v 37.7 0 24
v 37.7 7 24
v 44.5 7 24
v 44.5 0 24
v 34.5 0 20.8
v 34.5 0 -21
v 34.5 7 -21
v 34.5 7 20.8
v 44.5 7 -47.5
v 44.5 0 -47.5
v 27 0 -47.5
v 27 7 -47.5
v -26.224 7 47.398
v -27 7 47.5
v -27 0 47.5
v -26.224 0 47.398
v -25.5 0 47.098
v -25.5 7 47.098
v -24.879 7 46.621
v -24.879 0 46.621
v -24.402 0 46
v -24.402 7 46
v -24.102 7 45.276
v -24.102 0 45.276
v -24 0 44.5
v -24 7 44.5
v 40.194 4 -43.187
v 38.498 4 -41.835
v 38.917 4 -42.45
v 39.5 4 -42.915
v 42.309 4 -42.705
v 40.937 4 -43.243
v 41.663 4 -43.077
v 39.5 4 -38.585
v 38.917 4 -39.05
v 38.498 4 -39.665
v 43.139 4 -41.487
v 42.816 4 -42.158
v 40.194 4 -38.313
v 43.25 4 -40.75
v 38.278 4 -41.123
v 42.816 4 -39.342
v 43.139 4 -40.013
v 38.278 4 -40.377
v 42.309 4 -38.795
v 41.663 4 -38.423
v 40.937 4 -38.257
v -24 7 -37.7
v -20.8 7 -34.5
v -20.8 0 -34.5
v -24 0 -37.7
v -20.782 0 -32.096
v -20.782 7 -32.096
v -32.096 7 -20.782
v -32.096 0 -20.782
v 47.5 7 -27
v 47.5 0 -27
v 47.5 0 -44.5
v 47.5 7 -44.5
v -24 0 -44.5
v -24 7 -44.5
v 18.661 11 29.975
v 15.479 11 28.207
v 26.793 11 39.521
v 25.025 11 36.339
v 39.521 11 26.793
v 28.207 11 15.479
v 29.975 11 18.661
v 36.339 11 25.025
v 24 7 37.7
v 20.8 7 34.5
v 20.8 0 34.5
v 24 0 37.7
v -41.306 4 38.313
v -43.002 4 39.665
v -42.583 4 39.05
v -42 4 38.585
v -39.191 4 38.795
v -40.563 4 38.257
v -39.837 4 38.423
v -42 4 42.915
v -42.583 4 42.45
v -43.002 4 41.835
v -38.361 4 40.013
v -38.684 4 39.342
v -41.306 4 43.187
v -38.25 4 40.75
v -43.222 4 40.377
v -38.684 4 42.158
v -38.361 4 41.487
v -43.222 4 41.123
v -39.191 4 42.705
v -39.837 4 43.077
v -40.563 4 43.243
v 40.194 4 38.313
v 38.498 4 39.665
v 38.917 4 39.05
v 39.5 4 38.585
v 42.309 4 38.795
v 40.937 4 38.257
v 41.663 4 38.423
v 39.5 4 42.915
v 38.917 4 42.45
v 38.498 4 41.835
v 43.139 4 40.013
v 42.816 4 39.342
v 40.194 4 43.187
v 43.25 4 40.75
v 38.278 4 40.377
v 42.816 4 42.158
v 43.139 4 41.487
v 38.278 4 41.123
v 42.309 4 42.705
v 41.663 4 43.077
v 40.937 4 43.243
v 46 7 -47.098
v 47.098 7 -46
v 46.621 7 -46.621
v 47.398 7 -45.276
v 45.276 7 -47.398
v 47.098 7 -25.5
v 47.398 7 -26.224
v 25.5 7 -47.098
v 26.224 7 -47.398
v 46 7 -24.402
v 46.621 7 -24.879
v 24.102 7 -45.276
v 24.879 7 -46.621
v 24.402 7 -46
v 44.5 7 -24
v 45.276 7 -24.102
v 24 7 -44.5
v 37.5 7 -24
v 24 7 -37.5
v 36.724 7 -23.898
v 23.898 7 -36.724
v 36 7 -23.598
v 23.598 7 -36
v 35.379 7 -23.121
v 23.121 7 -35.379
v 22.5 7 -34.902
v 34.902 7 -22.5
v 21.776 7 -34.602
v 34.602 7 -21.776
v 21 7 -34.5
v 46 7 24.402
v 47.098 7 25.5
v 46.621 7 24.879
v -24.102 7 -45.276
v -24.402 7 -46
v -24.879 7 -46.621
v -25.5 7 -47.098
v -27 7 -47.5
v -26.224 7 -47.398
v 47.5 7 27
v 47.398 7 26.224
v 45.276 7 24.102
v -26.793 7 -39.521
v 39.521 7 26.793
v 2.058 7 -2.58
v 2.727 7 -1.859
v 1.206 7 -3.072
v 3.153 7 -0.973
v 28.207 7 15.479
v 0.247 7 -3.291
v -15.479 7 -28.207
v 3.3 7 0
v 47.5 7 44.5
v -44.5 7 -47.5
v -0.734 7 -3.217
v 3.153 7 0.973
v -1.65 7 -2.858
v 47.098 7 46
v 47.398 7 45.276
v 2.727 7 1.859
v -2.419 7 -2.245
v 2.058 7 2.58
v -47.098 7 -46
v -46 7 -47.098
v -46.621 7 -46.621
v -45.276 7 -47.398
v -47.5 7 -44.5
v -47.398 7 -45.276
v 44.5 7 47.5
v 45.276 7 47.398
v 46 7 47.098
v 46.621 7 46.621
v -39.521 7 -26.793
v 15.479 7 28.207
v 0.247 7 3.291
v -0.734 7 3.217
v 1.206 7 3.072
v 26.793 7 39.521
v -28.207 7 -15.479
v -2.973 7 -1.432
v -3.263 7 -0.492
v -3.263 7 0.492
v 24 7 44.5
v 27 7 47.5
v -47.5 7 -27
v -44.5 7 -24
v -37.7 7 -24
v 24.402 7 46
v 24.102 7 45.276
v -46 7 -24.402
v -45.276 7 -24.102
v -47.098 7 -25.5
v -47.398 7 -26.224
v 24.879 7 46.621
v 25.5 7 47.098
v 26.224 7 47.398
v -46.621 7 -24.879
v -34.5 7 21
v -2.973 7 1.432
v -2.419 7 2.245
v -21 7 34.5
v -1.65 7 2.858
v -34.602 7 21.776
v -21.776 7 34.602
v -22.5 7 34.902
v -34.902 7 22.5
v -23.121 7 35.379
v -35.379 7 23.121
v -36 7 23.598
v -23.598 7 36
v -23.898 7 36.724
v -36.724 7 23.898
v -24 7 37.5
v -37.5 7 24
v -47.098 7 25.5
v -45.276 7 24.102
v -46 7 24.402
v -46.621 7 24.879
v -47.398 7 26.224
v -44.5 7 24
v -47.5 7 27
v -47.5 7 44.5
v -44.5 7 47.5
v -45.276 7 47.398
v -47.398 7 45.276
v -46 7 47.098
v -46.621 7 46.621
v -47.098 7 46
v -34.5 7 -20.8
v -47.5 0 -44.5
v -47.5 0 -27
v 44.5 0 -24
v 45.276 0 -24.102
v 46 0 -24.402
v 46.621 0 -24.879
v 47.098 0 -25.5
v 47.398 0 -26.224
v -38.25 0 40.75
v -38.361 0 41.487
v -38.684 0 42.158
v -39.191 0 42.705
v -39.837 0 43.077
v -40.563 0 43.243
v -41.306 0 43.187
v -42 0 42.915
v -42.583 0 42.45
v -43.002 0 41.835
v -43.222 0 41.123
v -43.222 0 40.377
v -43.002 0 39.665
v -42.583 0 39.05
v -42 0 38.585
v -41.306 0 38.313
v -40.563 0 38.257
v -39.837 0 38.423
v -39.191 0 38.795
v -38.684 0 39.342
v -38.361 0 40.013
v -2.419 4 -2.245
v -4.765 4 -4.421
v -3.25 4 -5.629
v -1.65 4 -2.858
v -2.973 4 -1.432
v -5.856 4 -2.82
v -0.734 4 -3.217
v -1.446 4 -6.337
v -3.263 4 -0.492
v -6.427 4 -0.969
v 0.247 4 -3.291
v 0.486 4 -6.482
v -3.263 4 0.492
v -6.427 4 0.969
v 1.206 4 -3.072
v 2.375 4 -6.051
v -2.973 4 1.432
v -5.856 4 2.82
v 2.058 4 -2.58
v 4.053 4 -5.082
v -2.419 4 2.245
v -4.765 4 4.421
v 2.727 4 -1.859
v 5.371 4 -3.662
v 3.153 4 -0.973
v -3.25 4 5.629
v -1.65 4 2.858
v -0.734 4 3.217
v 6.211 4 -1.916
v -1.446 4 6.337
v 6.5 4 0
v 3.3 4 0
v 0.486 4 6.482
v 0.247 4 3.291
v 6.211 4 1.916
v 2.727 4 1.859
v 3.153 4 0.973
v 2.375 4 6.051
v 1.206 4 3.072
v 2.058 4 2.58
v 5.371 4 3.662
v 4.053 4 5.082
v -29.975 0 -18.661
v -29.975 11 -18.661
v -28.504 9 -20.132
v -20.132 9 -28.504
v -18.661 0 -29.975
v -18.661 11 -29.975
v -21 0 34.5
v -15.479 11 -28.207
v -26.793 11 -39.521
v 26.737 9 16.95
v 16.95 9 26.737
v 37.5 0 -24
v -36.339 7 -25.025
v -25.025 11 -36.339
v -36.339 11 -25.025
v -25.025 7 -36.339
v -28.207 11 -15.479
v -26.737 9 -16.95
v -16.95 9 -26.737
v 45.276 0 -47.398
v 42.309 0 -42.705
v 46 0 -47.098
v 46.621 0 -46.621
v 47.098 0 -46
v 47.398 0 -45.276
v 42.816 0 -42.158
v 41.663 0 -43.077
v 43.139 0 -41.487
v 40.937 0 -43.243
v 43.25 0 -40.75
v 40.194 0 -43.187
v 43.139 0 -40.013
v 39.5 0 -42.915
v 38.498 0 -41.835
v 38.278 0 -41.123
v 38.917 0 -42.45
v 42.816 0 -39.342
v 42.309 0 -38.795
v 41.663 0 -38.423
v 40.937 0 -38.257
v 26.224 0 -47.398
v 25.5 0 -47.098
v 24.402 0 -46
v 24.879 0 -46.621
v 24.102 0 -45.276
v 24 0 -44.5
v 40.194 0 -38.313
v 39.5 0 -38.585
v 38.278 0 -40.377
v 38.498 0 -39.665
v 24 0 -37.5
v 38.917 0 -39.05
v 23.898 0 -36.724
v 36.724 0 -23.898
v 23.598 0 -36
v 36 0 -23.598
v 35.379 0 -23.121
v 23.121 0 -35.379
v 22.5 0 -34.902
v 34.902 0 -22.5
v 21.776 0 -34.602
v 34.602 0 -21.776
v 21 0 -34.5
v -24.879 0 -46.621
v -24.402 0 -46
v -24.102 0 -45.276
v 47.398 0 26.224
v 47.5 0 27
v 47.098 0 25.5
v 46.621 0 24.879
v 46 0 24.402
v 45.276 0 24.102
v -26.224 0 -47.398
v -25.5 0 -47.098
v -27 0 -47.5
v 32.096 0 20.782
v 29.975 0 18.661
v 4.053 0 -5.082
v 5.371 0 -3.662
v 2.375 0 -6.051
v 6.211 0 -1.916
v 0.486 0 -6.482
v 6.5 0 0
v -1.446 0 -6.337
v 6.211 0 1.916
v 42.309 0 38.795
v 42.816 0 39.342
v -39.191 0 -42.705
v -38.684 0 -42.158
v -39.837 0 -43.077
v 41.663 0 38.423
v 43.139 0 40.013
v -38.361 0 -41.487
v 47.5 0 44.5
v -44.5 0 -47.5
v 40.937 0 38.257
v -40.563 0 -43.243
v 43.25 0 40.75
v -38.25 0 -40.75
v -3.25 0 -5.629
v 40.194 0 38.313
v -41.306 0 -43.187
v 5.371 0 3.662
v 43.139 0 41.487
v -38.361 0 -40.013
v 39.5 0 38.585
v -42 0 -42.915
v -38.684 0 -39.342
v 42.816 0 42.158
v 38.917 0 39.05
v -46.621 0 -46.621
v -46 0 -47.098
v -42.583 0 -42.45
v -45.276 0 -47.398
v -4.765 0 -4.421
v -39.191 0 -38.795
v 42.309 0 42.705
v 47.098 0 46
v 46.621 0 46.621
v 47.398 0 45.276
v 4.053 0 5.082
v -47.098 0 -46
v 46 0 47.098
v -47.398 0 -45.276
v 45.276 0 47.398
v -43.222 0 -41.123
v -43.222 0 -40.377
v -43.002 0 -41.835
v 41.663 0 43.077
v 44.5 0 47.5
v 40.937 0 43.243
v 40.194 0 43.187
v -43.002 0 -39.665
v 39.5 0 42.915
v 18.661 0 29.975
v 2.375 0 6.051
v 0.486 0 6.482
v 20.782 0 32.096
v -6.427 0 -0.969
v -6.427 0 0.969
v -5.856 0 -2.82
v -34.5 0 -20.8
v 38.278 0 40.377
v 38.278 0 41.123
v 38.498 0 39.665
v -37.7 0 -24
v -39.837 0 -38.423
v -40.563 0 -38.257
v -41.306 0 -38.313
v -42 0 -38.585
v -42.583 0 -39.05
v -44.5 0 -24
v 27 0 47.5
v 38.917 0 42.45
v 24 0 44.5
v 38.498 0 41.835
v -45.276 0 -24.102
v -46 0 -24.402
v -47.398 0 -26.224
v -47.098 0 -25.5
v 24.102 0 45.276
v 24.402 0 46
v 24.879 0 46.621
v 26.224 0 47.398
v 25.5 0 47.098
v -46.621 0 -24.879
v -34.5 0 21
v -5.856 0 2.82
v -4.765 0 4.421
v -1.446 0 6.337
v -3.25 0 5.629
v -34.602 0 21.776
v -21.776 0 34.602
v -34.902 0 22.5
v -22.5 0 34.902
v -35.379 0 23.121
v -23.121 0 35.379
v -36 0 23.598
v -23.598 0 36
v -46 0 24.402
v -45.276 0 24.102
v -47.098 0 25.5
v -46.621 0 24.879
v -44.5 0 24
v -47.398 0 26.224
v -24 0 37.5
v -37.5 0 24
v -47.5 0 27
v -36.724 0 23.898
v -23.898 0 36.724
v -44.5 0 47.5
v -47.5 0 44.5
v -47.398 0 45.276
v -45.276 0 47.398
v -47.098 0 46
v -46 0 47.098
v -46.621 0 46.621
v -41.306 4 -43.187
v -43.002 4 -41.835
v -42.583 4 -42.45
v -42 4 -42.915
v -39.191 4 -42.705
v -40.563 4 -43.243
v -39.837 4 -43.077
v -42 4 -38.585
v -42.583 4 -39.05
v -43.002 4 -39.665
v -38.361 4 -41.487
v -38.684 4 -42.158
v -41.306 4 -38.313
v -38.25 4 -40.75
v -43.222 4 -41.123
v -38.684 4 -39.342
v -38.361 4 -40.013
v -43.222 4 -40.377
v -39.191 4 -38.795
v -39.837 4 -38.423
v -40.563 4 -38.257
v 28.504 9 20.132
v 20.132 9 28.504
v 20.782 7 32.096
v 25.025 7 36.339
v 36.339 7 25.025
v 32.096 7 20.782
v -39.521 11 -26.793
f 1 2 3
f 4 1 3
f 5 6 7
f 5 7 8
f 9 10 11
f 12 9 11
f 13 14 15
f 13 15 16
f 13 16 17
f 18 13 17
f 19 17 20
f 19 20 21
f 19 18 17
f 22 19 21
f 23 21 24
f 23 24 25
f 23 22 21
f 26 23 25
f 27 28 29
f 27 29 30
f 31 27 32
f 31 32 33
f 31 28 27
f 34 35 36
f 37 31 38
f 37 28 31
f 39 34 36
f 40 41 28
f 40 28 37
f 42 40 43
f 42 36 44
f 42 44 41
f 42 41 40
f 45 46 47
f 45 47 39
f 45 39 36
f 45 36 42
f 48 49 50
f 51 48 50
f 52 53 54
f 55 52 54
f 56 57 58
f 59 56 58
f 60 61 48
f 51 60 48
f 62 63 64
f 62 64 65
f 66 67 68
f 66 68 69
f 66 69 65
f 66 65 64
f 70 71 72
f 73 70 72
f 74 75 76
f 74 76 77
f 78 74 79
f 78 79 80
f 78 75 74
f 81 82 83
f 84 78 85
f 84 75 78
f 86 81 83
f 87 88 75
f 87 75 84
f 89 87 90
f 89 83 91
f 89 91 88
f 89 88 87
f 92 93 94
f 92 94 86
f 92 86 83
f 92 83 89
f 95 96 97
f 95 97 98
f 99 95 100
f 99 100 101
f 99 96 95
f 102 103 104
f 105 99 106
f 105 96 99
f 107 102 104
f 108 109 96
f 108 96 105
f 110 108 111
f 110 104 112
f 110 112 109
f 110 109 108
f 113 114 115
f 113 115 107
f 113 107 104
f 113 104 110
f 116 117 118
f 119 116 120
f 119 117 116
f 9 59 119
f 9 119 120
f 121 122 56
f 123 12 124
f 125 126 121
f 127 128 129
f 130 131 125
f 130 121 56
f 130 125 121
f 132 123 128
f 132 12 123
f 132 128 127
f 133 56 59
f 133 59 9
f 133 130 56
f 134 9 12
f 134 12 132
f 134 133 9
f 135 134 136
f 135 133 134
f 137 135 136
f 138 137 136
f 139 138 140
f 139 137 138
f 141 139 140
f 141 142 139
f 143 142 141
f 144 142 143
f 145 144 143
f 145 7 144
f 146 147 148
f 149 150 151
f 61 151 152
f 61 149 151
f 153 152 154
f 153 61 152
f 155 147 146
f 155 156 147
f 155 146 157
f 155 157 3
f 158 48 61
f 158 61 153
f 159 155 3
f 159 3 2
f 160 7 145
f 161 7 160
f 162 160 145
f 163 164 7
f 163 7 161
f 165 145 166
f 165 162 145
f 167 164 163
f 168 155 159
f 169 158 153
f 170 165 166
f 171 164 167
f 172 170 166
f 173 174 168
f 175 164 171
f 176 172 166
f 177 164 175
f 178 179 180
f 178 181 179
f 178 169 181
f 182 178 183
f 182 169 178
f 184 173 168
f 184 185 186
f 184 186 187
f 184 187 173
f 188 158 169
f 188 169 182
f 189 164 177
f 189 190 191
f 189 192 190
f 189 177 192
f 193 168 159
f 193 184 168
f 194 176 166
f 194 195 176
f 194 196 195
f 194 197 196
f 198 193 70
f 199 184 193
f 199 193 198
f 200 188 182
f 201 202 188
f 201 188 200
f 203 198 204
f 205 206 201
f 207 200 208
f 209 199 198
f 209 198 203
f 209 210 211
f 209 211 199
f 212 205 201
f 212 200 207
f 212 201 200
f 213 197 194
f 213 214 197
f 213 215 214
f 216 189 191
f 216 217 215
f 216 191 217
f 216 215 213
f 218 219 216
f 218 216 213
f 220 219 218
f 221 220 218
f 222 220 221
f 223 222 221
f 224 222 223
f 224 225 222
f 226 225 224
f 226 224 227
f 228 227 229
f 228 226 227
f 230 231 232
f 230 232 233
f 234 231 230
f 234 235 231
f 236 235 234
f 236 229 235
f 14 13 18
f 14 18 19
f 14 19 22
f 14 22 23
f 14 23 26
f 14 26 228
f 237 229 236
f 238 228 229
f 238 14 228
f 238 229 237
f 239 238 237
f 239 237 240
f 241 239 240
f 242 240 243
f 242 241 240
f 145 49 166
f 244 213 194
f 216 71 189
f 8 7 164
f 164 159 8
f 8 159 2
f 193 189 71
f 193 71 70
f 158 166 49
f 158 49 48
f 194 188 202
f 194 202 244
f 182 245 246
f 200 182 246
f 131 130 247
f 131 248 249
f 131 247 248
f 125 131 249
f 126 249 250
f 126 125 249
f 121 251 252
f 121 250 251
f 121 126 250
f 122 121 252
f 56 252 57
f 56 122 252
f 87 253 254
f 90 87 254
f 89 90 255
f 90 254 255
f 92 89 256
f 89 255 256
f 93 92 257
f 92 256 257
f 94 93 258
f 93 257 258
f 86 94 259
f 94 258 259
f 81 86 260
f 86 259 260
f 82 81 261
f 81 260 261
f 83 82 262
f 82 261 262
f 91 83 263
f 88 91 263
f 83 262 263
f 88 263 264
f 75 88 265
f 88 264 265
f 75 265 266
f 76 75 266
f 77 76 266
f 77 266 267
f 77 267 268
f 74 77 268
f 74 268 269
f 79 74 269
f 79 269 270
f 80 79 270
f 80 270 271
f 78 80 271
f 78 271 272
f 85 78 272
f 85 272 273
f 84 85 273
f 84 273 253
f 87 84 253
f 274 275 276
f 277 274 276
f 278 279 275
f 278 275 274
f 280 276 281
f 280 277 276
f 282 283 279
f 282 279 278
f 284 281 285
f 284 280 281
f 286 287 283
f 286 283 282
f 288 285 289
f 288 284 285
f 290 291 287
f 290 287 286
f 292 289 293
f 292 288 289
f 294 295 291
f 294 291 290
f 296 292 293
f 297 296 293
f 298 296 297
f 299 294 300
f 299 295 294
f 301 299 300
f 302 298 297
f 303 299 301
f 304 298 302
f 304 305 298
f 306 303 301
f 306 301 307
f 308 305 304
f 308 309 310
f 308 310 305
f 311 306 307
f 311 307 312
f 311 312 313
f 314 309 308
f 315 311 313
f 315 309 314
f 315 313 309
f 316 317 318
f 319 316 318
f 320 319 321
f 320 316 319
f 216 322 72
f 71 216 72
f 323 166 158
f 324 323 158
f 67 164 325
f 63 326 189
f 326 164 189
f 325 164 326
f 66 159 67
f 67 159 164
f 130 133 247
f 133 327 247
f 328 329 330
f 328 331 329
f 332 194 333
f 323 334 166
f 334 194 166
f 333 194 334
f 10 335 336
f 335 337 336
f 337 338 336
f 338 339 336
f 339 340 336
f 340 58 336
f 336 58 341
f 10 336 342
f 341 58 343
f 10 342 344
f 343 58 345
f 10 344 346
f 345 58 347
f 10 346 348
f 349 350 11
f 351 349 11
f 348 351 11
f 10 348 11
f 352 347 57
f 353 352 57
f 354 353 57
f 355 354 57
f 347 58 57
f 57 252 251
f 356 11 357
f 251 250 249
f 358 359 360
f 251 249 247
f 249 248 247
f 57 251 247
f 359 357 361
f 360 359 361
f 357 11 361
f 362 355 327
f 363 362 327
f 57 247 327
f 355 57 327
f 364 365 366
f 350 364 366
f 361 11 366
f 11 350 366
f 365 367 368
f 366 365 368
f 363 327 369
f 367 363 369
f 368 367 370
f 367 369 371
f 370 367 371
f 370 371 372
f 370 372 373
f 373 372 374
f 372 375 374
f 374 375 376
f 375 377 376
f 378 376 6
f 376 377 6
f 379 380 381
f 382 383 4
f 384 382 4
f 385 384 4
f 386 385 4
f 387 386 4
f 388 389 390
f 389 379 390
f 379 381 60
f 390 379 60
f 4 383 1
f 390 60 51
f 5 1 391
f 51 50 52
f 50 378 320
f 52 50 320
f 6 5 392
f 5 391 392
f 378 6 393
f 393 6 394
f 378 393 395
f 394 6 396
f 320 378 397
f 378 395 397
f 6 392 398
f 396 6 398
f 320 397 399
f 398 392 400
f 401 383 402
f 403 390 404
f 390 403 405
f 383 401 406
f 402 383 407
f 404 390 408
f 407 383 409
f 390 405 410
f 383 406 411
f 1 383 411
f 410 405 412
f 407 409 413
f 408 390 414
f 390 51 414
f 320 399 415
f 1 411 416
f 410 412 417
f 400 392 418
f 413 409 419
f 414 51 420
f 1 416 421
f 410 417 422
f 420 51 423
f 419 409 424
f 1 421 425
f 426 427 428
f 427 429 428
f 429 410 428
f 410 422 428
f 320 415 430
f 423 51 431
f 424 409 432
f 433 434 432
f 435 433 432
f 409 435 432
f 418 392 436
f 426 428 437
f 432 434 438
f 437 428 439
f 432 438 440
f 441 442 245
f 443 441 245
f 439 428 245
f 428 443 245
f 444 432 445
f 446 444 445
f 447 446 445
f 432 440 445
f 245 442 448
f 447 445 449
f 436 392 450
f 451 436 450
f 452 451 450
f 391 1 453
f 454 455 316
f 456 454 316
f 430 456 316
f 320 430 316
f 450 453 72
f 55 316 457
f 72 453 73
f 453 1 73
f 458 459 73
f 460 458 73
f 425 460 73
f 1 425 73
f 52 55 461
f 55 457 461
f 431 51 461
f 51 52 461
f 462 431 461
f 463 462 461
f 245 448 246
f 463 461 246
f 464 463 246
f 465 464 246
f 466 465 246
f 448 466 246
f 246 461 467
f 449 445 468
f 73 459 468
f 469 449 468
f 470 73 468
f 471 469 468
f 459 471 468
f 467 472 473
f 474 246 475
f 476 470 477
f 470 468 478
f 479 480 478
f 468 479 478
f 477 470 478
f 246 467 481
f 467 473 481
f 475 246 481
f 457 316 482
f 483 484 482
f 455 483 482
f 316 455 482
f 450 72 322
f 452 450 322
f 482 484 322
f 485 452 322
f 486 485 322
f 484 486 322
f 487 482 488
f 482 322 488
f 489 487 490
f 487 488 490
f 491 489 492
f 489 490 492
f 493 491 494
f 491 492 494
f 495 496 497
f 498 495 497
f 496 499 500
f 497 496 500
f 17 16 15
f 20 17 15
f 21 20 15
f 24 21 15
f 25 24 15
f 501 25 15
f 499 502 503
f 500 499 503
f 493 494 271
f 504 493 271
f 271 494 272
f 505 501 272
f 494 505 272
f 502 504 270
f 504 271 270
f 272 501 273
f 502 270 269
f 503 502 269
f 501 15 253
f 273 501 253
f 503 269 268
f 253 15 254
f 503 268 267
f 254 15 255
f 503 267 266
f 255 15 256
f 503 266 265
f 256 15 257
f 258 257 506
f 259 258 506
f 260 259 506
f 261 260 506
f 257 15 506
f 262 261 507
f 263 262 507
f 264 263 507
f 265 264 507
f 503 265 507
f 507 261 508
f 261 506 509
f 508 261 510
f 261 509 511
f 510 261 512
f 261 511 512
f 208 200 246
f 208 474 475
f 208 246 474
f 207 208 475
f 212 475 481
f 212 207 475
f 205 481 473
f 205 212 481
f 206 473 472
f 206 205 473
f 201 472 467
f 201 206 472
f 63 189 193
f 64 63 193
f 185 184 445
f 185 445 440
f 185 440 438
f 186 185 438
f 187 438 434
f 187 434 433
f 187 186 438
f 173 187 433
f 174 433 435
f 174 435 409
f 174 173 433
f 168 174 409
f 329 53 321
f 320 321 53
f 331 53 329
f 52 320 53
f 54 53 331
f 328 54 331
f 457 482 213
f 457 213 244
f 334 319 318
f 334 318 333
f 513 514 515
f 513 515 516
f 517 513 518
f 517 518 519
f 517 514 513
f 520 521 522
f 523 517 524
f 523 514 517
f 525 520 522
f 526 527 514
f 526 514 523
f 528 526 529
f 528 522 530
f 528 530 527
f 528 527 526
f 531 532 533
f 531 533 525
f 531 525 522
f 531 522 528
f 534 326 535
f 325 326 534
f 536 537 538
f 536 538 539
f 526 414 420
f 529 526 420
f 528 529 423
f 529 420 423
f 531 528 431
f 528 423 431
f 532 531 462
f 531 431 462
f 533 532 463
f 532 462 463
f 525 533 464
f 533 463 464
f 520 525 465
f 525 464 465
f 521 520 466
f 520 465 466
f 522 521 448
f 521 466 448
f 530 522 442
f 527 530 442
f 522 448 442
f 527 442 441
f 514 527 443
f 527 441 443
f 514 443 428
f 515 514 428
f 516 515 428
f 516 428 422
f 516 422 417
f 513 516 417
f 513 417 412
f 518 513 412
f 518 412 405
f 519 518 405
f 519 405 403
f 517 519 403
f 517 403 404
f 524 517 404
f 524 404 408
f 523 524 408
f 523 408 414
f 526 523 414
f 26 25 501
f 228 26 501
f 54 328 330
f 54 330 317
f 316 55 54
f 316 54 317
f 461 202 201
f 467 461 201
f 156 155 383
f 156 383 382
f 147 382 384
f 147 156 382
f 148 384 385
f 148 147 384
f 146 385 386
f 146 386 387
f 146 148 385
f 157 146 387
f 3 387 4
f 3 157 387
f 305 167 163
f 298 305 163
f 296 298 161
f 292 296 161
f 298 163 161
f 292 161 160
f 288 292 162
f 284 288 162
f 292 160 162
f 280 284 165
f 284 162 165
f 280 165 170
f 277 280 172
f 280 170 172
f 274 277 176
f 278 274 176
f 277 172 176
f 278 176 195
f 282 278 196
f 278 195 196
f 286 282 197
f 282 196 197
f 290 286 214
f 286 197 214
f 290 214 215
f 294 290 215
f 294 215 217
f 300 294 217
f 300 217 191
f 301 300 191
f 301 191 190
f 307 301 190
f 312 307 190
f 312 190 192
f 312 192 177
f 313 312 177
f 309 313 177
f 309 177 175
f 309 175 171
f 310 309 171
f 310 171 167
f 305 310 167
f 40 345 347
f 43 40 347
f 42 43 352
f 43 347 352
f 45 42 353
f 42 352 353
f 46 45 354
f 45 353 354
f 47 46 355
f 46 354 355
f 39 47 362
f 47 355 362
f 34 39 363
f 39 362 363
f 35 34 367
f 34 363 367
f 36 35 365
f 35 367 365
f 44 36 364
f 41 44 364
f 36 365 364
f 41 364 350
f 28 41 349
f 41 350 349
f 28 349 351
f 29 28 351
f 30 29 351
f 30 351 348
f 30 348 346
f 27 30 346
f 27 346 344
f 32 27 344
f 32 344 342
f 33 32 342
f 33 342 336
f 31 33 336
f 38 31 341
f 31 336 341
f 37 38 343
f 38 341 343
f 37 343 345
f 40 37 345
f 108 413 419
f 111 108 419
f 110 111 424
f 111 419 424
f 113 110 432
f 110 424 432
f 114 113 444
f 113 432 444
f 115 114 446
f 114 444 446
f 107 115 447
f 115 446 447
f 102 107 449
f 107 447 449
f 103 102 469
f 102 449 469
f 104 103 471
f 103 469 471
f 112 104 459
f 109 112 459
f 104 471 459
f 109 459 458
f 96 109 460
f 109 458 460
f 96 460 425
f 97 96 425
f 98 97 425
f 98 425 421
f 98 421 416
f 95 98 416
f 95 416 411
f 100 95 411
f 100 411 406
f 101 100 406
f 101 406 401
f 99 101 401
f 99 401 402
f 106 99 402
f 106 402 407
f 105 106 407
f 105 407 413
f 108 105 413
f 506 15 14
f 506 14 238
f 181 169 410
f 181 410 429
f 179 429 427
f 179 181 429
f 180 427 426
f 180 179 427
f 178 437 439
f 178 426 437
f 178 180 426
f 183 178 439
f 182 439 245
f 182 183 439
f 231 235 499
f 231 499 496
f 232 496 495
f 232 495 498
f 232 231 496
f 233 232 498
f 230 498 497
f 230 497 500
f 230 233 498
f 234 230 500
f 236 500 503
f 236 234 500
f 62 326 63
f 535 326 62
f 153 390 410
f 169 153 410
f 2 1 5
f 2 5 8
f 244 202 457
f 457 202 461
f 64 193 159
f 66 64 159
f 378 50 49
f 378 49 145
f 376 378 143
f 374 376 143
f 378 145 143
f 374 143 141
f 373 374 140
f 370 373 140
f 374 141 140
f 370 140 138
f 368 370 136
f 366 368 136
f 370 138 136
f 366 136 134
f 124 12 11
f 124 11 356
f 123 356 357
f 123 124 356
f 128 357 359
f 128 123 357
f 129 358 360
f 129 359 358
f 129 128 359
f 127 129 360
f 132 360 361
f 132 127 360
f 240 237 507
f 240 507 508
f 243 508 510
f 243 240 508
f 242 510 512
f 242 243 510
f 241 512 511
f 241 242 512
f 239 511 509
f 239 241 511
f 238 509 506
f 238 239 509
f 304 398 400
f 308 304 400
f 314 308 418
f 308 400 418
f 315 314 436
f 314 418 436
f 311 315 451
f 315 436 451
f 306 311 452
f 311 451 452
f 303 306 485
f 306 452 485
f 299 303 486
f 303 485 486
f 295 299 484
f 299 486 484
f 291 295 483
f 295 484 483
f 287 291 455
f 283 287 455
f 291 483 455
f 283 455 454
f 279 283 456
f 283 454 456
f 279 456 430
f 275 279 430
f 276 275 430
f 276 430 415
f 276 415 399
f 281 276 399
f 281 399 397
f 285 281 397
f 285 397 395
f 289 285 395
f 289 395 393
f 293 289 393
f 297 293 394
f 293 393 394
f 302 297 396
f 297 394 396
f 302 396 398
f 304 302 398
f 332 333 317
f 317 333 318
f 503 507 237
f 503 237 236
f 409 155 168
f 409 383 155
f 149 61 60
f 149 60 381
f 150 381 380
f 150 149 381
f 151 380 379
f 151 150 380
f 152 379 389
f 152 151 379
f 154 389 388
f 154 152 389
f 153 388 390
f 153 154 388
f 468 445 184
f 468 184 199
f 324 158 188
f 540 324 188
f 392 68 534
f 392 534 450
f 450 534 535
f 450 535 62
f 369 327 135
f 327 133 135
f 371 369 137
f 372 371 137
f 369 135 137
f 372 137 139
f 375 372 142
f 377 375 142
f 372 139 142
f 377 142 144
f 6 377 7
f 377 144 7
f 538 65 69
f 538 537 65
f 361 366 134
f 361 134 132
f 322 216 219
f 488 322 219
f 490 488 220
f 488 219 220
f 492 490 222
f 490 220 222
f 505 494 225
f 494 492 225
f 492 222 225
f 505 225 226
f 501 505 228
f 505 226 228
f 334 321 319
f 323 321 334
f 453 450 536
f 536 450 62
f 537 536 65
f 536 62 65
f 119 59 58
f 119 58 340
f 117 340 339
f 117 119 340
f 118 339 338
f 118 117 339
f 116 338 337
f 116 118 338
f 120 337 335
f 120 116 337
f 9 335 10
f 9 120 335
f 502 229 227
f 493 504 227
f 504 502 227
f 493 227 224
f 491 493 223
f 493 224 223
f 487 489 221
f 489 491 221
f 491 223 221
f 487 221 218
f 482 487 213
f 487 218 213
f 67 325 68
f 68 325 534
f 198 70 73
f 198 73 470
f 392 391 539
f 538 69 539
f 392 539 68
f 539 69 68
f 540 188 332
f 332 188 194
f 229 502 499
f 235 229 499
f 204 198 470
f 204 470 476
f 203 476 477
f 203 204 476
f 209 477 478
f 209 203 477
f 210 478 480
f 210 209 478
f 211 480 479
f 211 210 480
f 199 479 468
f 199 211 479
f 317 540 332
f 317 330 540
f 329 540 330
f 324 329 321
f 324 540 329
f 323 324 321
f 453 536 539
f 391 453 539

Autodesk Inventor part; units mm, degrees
ref_plane "YZ Plane" through (0, 0, 0) normal (1, 0, 0) x (0, 1, 0)
ref_plane "XZ Plane" through (0, 0, 0) normal (0, 1, 0) x (-1, 0, 0)
ref_plane "XY Plane" through (0, 0, 0) normal (0, 0, 1) x (1, 0, 0)
sketch "Boceto1" plane through (0, 0, 0) normal (0, 1, 0) x (-1, 0, 0)
  line L0 (34.5, 0) -> (34.5, 24)
  line L1 (34.5, 24) -> (47.5, 24)
  line L2 (24, 47.5) -> (24, 34.5)
  line L3 (24, 34.5) -> (-24, 34.5)
  line L4 (-24, 34.5) -> (-24, 47.5)
  line L5 (-34.5, 24) -> (-47.5, 24)
  line L6 (47.5, 0) -> (-47.5, 0) construction
  line L7 (-47.5, 47.5) -> (-24, 47.5)
  line L8 (24, 47.5) -> (47.5, 47.5)
  line L9 (-47.5, 24) -> (-47.5, 47.5)
  line L10 (47.5, 47.5) -> (47.5, 24)
  line L11 (-34.5, 24) -> (-34.5, 0)
  line L12 (34.5, 0) -> (34.5, -24)
  line L13 (34.5, -24) -> (47.5, -24)
  line L14 (24, -47.5) -> (24, -34.5)
  line L15 (24, -34.5) -> (-24, -34.5)
  line L16 (-24, -34.5) -> (-24, -47.5)
  line L17 (-34.5, -24) -> (-47.5, -24)
  line L18 (-47.5, -47.5) -> (-24, -47.5)
  line L19 (24, -47.5) -> (47.5, -47.5)
  line L20 (-47.5, -24) -> (-47.5, -47.5)
  line L21 (47.5, -47.5) -> (47.5, -24)
  line L22 (-34.5, -24) -> (-34.5, 0)
  line L23 (-47.5, -47.5) -> (47.5, 47.5) construction
  line L24 (-47.5, 47.5) -> (47.5, -47.5) construction
  point P0 (0, 0)
  point P1 (0, -34.5)
  point P2 (24, 41)
  point P3 (0, 0)
  point P4 (35.75, 47.5)
  dimension "d0" = 95
  dimension "d9" = 13
  dimension "d10" = 23.5
  dimension "d15" = 23.5
  dimension "d71" = 95
extrude "Extrusión1" add sketch "Boceto1" along normal blind 7
chamfer "Chaflán4" distance 3.2 angle 45 4 edges at (24, 3.5, 34.5) (34.5, 3.5, 24) (-24, 3.5, -34.5) (-34.5, 3.5, -24)
sketch "Boceto2" plane through (0, 7, 0) normal (0, 1, 0) x (1, 0, 0)
  line L0 (-27.5, -27.5) -> (27.5, -27.5)
  line L1 (27.5, -27.5) -> (27.5, 27.5)
  line L2 (27.5, 27.5) -> (-27.5, 27.5)
  line L3 (-27.5, 27.5) -> (-27.5, -27.5)
  line L4 (-27.5, -27.5) -> (27.5, 27.5) construction
  line L5 (27.5, -27.5) -> (-27.5, 27.5) construction
  line L6 (-29.9749, 18.6612) -> (-18.6612, 29.9749)
  line L7 (-18.6612, 29.9749) -> (-25.0251, 36.3388)
  line L8 (-25.0251, 36.3388) -> (-36.3388, 25.0251)
  line L9 (-36.3388, 25.0251) -> (-29.9749, 18.6612)
  line L10 (-29.9749, 18.6612) -> (-25.0251, 36.3388) construction
  line L11 (-18.6612, 29.9749) -> (-36.3388, 25.0251) construction
  line L12 (-15.4792, 28.2071) -> (-26.7929, 39.5208)
  line L13 (-26.7929, 39.5208) -> (-39.5208, 26.7929)
  line L14 (-39.5208, 26.7929) -> (-28.2071, 15.4792)
  line L15 (-28.2071, 15.4792) -> (-15.4792, 28.2071)
  line L16 (-15.4792, 28.2071) -> (-39.5208, 26.7929) construction
  line L17 (-26.7929, 39.5208) -> (-28.2071, 15.4792) construction
  line L18 (-34.5, 24) -> (-34.5, -24) projected
  line L19 (-34.5, 0) -> (34.5, 0) construction
  line L20 (34.5, -24) -> (34.5, 24) projected
  line L21 (-18.6612, 29.9749) -> (-15.4792, 28.2071)
  line L22 (-29.9749, 18.6612) -> (-28.2071, 15.4792)
  line L23 (29.9749, -18.6612) -> (18.6612, -29.9749)
  line L24 (18.6612, -29.9749) -> (36.3388, -25.0251) construction
  line L25 (18.6612, -29.9749) -> (15.4792, -28.2071)
  line L26 (15.4792, -28.2071) -> (39.5208, -26.7929) construction
  line L27 (25.0251, -36.3388) -> (36.3388, -25.0251)
  line L28 (29.9749, -18.6612) -> (25.0251, -36.3388) construction
  line L29 (18.6612, -29.9749) -> (25.0251, -36.3388)
  line L30 (26.7929, -39.5208) -> (28.2071, -15.4792) construction
  line L31 (15.4792, -28.2071) -> (26.7929, -39.5208)
  line L32 (26.7929, -39.5208) -> (39.5208, -26.7929)
  line L33 (28.2071, -15.4792) -> (15.4792, -28.2071)
  line L34 (36.3388, -25.0251) -> (29.9749, -18.6612)
  line L35 (29.9749, -18.6612) -> (28.2071, -15.4792)
  line L36 (39.5208, -26.7929) -> (28.2071, -15.4792)
  point P0 (0, 0)
  point P1 (-27.5, 27.5)
  point P2 (27.5, -27.5)
  point P3 (27.5, -27.5)
  point P4 (34.5, -24)
  dimension "d21" = 55
  dimension "d22" = 55
  dimension "d23" = 16
  dimension "d24" = 9
  dimension "d25" = 18
  dimension "d26" = 16
  dimension "d51" = 135
  dimension "d52" = 135
  dimension "d55" = 360
sketch "Boceto3" plane through (0, 0, 0) normal (0, -1, 0) x (1, 0, 0)
  line L0 (47.5, 47.5) -> (47.5, 24) projected
  line L1 (47.5, 47.5) -> (24, 47.5)
  line L2 (24, 47.5) -> (24, 24)
  line L3 (24, 24) -> (47.5, 24)
  line L4 (47.5, 24) -> (47.5, 47.5)
  line L5 (24, 34.5) -> (24, 47.5) projected
  line L6 (47.5, 24) -> (34.5, 24) projected
  circle A0 centre (40.75, 40.75) radius 2.5
  line L7 (0, 48.9307) -> (0, -48.9307) construction
  line L8 (51.06, 0) -> (-51.06, 0) construction
  circle A1 centre (-40.75, 40.75) radius 2.5
  circle A2 centre (-40.75, -40.75) radius 2.5
  circle A3 centre (40.75, -40.75) radius 2.5
  line L9 (47.5, 47.5) -> (24, 24) construction
  line L10 (24, 47.5) -> (47.5, 24) construction
  point P0 (0, 0)
  point P1 (0, 0)
  point P2 (35.75, 35.75)
  dimension "d41" = 5
  dimension "d77" = 360
  dimension "d80" = 5
extrude "Extrusión6" cut sketch "Boceto3" against normal blind 4 contours A0 | A1 | A2 | A3
sketch "Boceto4" plane through (0, 7, 0) normal (0, 1, 0) x (1, 0, 0)
  circle A0 centre (0, 0) radius 3.3
  dimension "d44" = 6.6
extrude "Extrusión7" cut sketch "Boceto4" against normal up to next
sketch "Boceto5" plane through (0, 0, 0) normal (0, -1, 0) x (1, 0, 0)
  circle A0 centre (0, 0) radius 6.5
  dimension "d47" = 13
extrude "Extrusión8" cut sketch "Boceto5" against normal blind 4
extrude "Extrusión9" add sketch "Boceto2" along normal blind 4 contours L25 L29 L27 L34 L20 L36 L32 L31 | L14 L18 L9 L22 | L36 L20 L34 L35 | L14 L13 L12 L21 L7 L8 L9 L18
extrude "Extrusión10" add sketch "Boceto2" along normal blind 2 contours L33 L1 L23 L0 | L0 L23 L25 L33 | L15 L22 L6 L3 | L3 L6 L2 L15 | L33 L35 L23 L1 | L2 L6 L21 L15
chamfer "Chaflán3" distance 2 angle 45 4 edges at (-17.0702, 9, -29.091) (-29.091, 9, -17.0702) (29.091, 9, 17.0702) (17.0702, 9, 29.091)
sketch "Boceto7" plane through (0, 7, 0) normal (0, 1, 0) x (1, 0, 0)
  line L0 (20.7825, -32.0962) -> (32.0962, -20.7825)
  line L1 (32.0962, -20.7825) -> (29.9749, -18.6612)
  line L2 (29.9749, -18.6612) -> (18.6612, -29.9749)
  line L3 (18.6612, -29.9749) -> (20.7825, -32.0962)
  line L4 (20.7825, -32.0962) -> (29.9749, -18.6612) construction
  line L5 (32.0962, -20.7825) -> (18.6612, -29.9749) construction
  line L6 (20.132, -28.5041) -> (28.5041, -20.132) projected
  line L7 (18.6612, -29.9749) -> (25.0251, -36.3388) projected
  line L8 (-20.7825, 32.0962) -> (-32.0962, 20.7825)
  line L9 (-32.0962, 20.7825) -> (-29.9749, 18.6612)
  line L10 (-29.9749, 18.6612) -> (-18.6612, 29.9749)
  line L11 (-18.6612, 29.9749) -> (-20.7825, 32.0962)
  line L12 (-20.7825, 32.0962) -> (-29.9749, 18.6612) construction
  line L13 (-32.0962, 20.7825) -> (-18.6612, 29.9749) construction
  line L14 (36.3388, -25.0251) -> (29.9749, -18.6612) projected
  point P0 (0, 0)
  point P1 (25.3787, -25.3787)
  point P2 (-20.132, 28.5041)
  point P3 (-28.5041, 20.132)
  point P4 (-18.6612, 29.9749)
  point P5 (-25.3787, 25.3787)
  point P6 (33.5, -22.1863)
  dimension "d64" = 3
  dimension "d67" = 360
extrude "Extrusión11" cut sketch "Boceto7" against normal up to next
fillet "Empalme1" radius 3 16 edges at (24, 3.5, 47.5) (47.5, 3.5, 47.5) (47.5, 3.5, 24) (47.5, 3.5, -24) (34.5, 3.5, -24) (47.5, 3.5, -47.5) (24, 3.5, -47.5) (24, 3.5, -34.5) (-24, 3.5, -47.5) (-47.5, 3.5, -47.5) (-47.5, 3.5, -24) (-47.5, 3.5, 24) (-34.5, 3.5, 24) (-47.5, 3.5, 47.5) (-24, 3.5, 47.5) (-24, 3.5, 34.5)
equation "\"d15\" = d13"
equation "\"d13\" = 23.5"
properties part number "SistemaDeDesacople"
